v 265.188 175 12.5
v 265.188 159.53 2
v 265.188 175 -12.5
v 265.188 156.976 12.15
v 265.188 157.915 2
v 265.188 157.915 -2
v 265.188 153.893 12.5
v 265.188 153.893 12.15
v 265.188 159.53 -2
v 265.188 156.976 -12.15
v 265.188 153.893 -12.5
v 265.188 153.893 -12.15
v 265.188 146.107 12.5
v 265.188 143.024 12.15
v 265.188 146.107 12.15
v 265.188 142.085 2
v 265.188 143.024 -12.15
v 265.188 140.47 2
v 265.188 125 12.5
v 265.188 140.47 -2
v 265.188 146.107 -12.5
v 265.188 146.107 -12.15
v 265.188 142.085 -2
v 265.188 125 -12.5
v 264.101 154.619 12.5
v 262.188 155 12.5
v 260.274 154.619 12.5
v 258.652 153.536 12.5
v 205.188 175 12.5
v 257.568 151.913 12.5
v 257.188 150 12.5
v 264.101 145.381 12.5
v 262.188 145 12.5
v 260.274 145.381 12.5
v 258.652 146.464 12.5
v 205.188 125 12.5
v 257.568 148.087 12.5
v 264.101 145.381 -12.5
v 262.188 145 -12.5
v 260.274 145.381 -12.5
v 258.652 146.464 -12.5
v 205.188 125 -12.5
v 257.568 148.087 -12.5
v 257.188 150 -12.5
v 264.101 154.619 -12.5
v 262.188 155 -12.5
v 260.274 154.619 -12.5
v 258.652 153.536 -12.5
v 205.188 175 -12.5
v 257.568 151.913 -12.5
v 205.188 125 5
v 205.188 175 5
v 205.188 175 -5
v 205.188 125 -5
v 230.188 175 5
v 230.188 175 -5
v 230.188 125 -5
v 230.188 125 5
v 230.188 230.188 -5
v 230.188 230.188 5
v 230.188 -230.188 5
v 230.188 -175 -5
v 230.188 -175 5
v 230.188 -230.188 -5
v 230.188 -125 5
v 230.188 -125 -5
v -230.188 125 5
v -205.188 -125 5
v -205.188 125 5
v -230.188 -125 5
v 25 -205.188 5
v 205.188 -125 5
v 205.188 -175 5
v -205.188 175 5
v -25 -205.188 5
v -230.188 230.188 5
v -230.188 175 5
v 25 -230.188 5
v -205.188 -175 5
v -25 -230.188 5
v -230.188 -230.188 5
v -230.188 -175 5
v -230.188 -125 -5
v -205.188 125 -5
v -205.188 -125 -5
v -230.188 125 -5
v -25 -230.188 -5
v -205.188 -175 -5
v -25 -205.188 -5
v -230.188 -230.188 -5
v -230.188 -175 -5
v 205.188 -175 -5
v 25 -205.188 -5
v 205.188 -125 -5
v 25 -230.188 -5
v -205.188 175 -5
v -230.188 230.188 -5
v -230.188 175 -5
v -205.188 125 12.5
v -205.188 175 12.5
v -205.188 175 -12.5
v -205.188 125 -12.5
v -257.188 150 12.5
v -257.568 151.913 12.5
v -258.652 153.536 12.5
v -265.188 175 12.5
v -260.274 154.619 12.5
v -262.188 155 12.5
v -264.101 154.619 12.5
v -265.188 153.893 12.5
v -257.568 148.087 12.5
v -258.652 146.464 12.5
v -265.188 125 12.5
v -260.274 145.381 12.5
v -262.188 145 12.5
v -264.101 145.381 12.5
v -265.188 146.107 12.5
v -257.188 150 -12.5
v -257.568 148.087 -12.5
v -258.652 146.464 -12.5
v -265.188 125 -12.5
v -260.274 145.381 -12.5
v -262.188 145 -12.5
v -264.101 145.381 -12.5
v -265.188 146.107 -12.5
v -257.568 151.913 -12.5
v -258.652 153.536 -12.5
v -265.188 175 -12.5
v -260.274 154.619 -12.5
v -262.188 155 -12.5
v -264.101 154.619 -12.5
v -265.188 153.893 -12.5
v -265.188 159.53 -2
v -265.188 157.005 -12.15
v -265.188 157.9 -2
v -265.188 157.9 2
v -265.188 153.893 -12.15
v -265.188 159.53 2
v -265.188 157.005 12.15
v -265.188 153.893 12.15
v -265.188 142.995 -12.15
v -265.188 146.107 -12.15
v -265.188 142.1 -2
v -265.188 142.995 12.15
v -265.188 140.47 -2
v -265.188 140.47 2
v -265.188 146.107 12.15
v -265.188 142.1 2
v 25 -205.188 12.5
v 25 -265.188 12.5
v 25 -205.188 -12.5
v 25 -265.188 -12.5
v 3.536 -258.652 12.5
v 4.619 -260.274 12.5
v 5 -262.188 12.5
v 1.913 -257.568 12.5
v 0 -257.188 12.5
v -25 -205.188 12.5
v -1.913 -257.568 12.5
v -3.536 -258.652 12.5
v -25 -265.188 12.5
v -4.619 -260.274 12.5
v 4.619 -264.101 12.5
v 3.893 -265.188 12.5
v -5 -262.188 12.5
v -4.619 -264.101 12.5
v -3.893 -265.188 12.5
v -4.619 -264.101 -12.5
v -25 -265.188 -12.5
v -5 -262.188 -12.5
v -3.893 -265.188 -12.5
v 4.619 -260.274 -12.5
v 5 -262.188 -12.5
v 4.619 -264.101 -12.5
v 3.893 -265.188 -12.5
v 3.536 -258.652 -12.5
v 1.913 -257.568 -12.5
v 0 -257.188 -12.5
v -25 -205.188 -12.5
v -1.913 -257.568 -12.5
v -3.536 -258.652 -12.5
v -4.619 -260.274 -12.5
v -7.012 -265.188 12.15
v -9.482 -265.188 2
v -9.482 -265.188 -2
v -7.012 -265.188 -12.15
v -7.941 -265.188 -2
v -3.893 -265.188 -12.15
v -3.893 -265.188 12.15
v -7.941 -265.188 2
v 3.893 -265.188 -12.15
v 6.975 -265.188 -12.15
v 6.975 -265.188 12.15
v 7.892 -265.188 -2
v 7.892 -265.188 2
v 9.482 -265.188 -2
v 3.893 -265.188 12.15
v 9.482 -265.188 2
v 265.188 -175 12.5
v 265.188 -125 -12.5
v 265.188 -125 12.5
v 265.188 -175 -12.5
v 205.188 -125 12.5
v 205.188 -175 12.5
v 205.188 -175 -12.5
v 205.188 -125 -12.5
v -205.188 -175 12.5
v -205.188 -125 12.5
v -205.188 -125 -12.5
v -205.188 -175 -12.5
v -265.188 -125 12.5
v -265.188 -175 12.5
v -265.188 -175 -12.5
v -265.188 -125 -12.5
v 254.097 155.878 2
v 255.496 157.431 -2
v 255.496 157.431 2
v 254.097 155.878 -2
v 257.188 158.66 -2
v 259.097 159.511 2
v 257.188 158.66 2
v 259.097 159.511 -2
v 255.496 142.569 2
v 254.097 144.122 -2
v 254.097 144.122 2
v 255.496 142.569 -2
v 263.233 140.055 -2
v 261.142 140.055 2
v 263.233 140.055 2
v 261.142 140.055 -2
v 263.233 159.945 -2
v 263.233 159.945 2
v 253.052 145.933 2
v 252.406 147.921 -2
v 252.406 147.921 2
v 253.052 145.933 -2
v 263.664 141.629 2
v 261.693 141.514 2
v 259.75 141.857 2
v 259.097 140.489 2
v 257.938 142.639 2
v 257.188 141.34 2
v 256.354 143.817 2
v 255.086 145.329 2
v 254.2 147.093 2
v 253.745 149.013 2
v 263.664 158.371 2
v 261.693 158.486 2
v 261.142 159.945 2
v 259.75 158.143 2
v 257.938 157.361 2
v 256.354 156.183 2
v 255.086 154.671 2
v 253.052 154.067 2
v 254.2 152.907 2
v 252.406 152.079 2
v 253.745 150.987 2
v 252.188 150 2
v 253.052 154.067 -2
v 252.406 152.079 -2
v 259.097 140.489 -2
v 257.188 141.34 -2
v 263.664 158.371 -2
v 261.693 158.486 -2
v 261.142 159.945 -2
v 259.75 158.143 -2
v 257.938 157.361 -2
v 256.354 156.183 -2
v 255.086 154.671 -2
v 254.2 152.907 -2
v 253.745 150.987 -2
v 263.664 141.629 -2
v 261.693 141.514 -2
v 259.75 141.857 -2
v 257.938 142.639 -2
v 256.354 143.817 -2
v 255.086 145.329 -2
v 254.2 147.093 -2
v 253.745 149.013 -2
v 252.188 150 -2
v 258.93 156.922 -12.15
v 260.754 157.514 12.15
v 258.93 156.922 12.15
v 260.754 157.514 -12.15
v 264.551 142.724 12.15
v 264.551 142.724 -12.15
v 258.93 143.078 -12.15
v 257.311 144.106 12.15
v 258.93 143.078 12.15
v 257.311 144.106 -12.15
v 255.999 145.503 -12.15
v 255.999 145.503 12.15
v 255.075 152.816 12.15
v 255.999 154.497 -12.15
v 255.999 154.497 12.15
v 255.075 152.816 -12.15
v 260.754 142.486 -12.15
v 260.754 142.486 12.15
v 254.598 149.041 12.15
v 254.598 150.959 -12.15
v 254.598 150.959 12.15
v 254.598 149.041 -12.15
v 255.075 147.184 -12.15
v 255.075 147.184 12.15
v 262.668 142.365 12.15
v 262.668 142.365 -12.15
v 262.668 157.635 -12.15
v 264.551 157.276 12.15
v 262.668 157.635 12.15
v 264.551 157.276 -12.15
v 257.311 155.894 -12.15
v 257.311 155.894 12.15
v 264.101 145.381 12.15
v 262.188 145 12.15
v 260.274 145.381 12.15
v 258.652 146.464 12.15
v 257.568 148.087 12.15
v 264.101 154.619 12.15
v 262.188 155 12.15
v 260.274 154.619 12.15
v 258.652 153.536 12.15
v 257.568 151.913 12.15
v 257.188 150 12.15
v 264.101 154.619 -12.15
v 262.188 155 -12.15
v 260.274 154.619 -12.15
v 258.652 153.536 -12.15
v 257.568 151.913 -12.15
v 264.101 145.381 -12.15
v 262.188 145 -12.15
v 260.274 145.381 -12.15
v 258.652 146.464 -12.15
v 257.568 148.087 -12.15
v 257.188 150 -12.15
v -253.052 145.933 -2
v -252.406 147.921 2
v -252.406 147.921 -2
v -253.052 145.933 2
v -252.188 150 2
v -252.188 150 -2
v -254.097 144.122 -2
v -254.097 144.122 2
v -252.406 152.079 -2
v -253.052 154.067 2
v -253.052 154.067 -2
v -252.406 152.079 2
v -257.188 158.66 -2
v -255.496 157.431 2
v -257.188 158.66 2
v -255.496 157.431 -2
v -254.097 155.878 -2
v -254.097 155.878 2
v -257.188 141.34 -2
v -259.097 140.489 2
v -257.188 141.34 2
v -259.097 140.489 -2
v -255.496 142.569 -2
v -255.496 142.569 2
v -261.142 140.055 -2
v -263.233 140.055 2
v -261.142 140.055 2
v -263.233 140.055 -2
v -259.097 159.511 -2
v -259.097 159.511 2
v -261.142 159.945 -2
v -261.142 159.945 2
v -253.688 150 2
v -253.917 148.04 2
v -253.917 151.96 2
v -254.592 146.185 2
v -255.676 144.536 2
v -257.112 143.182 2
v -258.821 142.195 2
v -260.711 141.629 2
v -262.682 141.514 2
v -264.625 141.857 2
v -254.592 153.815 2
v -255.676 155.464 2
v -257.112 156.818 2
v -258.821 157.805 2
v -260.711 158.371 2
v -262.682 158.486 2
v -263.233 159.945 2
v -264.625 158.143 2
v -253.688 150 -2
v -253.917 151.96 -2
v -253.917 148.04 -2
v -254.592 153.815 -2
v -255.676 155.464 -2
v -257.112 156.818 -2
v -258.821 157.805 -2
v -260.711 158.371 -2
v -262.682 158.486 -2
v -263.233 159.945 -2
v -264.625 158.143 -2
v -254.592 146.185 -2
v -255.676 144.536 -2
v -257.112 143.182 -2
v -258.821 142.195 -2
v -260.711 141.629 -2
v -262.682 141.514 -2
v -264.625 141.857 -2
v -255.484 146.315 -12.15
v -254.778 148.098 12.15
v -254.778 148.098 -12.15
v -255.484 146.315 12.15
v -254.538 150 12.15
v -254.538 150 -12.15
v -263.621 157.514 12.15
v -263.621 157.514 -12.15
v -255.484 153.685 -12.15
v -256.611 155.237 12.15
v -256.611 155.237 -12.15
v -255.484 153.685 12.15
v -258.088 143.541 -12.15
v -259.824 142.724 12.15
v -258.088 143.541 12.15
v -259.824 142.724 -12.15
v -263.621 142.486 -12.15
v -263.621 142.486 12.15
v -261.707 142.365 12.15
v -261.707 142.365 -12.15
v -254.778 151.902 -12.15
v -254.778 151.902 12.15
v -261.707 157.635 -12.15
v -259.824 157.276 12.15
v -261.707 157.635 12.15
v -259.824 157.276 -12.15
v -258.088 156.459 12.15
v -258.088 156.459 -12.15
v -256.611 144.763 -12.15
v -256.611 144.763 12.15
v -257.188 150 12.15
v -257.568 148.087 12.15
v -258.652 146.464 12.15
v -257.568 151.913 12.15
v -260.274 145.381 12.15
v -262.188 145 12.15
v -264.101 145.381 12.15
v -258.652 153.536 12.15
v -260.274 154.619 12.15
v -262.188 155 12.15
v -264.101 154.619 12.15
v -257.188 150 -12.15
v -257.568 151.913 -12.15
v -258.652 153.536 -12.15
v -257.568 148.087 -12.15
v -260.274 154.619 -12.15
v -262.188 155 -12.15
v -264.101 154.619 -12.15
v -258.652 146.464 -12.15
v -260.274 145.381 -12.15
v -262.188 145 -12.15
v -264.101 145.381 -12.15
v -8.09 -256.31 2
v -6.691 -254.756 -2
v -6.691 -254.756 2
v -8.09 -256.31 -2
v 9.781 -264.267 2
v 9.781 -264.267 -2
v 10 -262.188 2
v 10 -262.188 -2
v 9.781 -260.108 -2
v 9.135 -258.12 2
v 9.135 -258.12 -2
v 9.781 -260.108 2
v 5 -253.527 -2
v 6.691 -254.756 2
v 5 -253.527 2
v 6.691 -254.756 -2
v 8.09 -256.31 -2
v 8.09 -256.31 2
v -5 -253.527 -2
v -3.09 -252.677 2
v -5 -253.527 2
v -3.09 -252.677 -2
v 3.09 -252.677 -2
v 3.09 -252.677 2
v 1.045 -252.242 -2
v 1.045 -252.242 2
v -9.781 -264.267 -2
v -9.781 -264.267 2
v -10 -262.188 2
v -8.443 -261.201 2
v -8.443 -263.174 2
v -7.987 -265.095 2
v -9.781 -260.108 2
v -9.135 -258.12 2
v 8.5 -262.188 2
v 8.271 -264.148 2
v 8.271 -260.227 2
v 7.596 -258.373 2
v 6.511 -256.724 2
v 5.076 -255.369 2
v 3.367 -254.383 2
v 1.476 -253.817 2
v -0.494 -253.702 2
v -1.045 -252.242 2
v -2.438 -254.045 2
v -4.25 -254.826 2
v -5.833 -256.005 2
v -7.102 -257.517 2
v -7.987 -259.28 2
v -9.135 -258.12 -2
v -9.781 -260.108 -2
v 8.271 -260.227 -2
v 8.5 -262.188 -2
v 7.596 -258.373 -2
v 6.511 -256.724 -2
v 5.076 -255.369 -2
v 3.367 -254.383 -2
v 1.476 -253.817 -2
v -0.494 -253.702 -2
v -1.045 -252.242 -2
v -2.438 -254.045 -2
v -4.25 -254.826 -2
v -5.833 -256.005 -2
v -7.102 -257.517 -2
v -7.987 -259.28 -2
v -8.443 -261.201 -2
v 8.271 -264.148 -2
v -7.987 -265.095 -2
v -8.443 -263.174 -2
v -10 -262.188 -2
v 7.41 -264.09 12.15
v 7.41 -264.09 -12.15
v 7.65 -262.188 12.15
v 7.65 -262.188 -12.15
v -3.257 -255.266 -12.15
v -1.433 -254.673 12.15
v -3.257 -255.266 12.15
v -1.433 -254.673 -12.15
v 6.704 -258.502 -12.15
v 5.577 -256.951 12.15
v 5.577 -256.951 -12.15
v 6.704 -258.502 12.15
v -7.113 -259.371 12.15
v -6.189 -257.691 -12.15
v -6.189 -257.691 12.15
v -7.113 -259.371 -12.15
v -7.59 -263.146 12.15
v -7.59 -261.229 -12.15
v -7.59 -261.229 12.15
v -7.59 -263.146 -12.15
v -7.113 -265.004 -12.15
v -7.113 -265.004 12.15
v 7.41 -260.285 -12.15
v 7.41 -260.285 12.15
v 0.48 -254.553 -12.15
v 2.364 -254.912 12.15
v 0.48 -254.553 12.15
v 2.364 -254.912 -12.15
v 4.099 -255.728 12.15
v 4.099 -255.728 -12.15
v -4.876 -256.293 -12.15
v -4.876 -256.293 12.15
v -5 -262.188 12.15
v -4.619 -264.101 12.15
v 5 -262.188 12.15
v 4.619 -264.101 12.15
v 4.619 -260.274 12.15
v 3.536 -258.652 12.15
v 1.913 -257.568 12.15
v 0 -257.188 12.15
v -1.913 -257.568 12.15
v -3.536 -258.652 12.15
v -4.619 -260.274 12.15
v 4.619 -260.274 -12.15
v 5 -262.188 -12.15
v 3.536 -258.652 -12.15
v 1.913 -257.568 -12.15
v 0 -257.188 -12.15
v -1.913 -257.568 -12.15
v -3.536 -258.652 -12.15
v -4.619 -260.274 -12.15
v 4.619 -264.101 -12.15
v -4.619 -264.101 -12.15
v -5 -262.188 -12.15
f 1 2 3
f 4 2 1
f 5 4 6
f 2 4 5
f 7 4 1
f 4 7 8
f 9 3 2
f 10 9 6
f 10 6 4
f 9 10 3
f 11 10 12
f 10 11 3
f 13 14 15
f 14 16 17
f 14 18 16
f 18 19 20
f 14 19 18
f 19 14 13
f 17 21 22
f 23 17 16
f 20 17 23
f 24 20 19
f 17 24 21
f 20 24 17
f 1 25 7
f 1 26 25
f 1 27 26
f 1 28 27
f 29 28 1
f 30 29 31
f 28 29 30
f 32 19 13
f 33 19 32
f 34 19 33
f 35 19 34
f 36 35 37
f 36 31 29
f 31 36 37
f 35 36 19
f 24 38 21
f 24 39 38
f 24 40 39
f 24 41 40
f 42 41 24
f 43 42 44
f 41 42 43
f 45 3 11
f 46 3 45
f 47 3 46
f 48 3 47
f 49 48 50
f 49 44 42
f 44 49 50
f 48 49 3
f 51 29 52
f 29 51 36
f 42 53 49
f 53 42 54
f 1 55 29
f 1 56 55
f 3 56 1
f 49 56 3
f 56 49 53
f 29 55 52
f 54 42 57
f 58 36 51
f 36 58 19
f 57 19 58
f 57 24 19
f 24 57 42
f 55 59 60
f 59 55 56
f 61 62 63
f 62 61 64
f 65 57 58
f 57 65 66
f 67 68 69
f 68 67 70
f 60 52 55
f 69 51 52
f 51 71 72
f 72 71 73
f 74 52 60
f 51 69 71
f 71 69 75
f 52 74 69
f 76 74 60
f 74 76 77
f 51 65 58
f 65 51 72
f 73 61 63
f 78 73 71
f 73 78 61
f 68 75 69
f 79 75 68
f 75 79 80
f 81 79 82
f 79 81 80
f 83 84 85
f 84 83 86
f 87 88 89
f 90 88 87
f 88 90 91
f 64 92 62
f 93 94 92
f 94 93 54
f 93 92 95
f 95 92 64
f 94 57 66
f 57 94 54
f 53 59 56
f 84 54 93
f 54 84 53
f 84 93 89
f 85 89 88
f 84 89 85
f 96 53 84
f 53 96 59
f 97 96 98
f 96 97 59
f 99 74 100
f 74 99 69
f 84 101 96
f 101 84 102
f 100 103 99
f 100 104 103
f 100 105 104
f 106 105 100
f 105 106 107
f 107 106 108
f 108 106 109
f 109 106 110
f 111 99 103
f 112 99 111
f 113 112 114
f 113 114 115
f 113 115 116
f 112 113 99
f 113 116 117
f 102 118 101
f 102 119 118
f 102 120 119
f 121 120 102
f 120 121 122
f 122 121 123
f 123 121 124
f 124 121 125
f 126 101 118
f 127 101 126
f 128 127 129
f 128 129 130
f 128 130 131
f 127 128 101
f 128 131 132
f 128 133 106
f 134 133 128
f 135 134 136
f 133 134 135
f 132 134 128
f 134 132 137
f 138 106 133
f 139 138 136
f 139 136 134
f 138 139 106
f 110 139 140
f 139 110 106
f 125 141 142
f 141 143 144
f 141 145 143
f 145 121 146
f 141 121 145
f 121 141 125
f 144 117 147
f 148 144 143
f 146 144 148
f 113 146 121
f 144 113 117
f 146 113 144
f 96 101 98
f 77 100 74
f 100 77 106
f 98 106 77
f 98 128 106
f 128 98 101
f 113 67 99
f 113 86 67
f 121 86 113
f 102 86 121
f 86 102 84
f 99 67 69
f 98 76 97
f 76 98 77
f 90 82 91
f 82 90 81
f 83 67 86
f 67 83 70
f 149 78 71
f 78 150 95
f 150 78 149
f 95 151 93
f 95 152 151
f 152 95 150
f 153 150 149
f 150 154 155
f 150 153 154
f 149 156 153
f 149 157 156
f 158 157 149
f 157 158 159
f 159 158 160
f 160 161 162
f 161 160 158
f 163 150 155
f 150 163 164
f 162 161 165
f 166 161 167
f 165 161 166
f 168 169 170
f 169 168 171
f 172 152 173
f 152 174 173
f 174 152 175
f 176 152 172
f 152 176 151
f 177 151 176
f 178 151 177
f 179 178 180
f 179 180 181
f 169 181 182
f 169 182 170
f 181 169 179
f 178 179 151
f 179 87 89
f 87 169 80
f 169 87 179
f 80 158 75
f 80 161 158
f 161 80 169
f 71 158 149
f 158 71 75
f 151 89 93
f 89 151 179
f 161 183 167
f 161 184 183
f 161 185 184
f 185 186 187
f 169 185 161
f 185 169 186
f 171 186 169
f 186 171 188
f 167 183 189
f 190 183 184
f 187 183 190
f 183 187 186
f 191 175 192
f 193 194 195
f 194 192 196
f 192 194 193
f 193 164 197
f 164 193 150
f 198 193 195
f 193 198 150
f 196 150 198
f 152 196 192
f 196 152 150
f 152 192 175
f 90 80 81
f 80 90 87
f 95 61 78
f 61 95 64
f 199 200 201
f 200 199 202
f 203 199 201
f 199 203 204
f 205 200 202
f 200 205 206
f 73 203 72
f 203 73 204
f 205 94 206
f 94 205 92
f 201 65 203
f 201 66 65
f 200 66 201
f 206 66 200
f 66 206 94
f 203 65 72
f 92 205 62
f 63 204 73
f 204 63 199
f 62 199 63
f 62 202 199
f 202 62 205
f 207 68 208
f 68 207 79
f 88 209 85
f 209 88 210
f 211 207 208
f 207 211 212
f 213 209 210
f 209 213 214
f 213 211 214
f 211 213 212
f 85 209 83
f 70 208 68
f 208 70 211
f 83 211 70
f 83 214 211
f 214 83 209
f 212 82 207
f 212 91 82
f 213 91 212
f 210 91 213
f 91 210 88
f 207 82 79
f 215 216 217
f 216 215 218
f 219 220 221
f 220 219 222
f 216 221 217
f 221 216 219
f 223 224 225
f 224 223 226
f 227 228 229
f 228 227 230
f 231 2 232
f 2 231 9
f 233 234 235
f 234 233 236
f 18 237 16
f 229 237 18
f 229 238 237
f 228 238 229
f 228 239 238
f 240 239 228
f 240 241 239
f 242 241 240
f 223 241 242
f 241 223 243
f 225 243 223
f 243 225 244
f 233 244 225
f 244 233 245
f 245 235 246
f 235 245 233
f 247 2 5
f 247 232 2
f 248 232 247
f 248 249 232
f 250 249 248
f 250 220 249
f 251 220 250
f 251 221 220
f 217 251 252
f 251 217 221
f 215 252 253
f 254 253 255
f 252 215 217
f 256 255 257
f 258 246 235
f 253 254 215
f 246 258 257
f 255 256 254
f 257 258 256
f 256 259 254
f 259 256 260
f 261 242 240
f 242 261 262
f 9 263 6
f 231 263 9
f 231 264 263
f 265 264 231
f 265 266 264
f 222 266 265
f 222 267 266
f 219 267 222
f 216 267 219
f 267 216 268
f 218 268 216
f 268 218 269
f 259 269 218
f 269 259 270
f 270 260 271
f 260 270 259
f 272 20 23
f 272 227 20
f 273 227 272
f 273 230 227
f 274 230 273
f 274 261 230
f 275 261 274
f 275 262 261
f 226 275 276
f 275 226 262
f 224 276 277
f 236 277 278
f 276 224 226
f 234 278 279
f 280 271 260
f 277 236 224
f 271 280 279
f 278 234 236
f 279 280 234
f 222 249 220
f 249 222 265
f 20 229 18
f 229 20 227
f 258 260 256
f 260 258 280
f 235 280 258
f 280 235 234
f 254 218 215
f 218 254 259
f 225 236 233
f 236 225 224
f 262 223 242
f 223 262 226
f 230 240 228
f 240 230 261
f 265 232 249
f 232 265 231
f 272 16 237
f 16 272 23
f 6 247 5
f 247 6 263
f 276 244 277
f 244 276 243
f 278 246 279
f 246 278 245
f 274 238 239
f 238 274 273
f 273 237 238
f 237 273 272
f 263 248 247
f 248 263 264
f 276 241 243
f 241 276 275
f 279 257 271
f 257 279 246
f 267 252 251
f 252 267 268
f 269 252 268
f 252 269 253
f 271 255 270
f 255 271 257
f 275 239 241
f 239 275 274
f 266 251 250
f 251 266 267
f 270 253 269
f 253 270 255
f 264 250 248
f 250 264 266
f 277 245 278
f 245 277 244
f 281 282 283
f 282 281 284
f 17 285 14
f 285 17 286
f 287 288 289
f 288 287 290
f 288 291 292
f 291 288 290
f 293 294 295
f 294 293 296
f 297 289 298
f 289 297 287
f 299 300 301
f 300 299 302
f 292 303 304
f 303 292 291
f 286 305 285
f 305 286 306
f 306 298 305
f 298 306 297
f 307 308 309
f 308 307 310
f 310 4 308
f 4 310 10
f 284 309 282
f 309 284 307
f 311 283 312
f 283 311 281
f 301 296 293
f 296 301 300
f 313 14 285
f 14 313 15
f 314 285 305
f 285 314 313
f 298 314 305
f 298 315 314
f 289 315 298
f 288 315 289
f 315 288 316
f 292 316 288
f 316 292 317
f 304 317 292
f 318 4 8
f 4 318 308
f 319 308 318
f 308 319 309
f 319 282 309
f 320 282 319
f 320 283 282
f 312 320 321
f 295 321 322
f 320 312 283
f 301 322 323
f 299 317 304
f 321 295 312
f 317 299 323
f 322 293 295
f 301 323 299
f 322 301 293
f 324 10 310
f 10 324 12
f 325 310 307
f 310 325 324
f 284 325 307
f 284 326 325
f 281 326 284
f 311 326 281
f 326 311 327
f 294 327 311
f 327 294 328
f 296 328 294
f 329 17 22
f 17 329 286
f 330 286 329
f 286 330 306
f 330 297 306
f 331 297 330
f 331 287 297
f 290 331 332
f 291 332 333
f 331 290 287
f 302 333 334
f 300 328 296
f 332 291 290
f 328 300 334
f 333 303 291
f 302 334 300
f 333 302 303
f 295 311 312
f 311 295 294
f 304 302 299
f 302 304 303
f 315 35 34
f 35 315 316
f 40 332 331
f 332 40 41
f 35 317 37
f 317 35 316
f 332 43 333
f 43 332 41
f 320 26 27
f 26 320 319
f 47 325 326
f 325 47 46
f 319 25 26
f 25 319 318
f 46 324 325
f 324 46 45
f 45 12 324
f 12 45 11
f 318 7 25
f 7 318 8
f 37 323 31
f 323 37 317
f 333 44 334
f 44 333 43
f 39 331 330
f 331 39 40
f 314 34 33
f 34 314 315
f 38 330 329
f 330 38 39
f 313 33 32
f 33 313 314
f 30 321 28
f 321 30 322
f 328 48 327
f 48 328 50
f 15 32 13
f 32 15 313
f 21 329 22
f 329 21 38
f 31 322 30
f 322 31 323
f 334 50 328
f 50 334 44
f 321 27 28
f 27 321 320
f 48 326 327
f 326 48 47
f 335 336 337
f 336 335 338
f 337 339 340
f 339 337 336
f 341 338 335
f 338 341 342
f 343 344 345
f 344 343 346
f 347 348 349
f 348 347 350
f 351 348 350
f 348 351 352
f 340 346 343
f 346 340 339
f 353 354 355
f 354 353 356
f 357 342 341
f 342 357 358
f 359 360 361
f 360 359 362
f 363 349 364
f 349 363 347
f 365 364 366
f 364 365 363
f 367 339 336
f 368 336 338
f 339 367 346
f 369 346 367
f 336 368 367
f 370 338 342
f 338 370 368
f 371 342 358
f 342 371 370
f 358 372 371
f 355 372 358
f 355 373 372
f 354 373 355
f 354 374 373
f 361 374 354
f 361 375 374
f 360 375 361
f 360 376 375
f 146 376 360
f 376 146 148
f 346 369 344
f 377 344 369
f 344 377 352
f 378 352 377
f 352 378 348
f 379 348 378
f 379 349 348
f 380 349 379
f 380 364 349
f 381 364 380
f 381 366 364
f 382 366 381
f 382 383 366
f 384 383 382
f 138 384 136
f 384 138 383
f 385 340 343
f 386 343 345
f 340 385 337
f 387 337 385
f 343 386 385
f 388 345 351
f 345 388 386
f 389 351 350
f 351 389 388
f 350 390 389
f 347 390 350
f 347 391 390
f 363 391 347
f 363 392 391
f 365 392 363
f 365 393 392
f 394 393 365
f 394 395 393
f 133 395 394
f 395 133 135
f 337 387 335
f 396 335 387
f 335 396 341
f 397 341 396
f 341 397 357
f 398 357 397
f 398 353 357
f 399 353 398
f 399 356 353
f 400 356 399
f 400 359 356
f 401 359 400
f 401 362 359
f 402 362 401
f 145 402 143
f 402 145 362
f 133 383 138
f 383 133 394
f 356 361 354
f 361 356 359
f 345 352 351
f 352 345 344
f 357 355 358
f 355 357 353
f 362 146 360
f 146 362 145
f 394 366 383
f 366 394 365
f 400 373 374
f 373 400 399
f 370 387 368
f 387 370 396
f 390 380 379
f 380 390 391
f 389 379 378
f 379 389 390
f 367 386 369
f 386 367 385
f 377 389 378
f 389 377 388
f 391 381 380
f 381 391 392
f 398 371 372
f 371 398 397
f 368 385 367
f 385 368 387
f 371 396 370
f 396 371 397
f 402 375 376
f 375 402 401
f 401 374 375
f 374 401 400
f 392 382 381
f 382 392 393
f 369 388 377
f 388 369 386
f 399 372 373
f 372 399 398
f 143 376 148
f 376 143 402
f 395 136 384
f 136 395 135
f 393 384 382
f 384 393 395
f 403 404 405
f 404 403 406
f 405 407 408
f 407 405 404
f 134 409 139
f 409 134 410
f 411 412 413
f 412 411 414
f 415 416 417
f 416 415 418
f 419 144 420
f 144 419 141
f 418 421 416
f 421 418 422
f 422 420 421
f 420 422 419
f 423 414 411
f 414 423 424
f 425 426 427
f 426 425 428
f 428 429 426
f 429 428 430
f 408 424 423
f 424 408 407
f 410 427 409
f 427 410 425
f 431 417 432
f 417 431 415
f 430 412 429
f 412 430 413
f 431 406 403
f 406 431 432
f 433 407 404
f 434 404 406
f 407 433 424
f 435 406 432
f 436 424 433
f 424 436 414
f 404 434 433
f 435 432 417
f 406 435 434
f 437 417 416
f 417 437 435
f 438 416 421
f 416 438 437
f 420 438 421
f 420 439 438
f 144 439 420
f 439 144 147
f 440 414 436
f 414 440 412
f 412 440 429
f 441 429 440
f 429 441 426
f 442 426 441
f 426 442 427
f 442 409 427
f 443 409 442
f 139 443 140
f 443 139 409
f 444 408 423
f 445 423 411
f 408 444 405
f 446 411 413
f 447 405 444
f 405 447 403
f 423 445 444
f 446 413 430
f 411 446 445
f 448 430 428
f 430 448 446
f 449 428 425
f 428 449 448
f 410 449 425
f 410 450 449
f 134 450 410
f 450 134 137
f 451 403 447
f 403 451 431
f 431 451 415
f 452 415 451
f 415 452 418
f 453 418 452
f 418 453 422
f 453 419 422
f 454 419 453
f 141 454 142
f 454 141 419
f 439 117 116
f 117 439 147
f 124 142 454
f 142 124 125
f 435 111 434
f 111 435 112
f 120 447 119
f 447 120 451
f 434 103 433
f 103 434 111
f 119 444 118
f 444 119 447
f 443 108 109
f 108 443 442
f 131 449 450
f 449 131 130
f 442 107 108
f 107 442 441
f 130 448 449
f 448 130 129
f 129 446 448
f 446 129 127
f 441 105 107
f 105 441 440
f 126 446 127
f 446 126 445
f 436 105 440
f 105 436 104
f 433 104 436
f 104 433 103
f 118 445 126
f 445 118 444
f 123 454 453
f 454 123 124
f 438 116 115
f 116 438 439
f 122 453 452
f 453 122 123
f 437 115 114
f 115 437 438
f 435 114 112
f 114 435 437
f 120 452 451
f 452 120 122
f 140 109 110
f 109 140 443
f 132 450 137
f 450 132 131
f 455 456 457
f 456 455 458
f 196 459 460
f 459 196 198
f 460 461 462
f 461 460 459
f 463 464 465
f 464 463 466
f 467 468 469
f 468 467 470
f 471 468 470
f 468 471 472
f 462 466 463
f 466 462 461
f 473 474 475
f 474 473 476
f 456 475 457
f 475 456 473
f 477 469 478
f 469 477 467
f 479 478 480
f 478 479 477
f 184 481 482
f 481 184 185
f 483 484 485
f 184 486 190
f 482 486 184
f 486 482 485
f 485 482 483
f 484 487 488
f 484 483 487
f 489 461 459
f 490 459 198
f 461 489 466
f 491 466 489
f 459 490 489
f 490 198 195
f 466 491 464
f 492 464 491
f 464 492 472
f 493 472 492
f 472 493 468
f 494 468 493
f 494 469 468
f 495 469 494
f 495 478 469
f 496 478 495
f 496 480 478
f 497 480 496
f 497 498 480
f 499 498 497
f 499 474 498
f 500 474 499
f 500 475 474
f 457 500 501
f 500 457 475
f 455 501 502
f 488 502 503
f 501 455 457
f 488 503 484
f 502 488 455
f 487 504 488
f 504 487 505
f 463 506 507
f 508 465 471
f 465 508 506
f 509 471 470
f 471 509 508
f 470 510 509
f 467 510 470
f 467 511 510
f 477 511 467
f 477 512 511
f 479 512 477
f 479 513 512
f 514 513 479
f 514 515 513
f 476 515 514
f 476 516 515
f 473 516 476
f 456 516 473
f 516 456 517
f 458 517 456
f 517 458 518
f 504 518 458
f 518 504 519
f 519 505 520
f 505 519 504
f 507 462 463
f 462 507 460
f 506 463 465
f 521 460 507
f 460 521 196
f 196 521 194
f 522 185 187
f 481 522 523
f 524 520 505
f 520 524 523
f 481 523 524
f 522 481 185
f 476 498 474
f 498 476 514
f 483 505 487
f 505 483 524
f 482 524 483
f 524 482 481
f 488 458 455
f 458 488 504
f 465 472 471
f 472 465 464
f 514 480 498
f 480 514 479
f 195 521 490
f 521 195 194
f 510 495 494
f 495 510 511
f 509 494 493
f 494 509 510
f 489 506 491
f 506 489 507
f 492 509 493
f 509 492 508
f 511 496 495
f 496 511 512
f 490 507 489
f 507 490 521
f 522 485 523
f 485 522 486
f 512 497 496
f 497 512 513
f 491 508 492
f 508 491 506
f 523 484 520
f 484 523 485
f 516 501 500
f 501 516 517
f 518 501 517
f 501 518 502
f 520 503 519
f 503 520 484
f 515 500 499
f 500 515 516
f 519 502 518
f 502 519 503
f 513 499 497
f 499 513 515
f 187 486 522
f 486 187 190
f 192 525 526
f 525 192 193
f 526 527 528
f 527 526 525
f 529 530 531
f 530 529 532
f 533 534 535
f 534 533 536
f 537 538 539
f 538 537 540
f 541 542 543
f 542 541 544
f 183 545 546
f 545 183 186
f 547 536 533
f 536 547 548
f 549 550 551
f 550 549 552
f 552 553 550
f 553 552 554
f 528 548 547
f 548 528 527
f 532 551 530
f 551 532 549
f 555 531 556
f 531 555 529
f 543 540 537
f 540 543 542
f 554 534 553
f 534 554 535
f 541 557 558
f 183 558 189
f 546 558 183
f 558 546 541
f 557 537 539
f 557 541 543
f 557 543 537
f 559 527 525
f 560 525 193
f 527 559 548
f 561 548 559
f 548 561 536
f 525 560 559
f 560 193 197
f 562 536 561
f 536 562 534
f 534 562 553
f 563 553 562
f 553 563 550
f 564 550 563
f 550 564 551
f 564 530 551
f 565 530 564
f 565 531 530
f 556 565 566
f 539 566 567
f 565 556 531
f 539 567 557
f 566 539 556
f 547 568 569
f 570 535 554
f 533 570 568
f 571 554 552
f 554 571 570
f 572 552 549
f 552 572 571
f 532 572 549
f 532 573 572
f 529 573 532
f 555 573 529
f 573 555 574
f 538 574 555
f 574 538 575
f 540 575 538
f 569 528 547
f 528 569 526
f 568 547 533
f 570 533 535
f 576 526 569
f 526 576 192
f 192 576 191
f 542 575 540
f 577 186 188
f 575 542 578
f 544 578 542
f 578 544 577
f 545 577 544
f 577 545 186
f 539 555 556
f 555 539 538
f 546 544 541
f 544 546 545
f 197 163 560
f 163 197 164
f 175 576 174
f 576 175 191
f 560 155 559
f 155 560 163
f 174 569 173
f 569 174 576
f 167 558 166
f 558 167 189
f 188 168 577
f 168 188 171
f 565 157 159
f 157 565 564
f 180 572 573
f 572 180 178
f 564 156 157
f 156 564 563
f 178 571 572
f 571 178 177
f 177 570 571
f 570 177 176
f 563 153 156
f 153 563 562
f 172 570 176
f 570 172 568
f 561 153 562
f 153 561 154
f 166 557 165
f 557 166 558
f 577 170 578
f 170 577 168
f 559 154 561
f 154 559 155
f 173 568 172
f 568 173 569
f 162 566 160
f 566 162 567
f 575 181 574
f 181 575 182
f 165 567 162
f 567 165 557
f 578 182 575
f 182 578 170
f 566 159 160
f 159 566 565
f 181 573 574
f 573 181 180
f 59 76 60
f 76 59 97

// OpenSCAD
// file: xcarriage.scad
$fn = 50;
module bearing(){
	rotate([90,0,0]){
		cylinder(24.3,7.65,7.65,true);
		cylinder(500,5,5,true);
		difference(){
			cylinder(4,10,10,true);
			cylinder(4.5,8.5,8.5,true);
		}
	}
}
module e3dlite(){
    translate([0,0,24 + 3.7/2]){
        cylinder(3.9,8,8,true);
    }
    translate([0,0,21]){
        cylinder(6.1,6,6,true);
    }
    translate([0,0,16.5]){
        cylinder(3.2,8,8,true);
    }
    cylinder(30,11.5,11.5,true);
}
module test(a,l){
	difference() {
		cylinder(r=a, h=10, center=true);
		cylinder(r=a-.1, h=10, center=true);
		translate([0, -l, 0]) {
			cube(2*a, center=true);
		}
	}
}
module minktest(a,l,w) {
	minkowski(){
		test(a,l);
		cylinder(.1,w,w);
	}
}
module catch(){
    cylinder(8,.75,.75,true,$fn=4);
	translate([2,0,0]){
		cylinder(8,.75,.75,true,$fn=4);
	}
	translate([-2,0,0]){
		cylinder(8,.75,.75,true,$fn=4);
	}
	translate([4,0,0]){
		cylinder(8,.75,.75,true,$fn=4);
	}
	translate([-4,0,0]){
		cylinder(8,.75,.75,true,$fn=4);
	}
	
}
module thing(){
	translate([0, -10, 5]) {
			cylinder(15,11.5,15,true);
	}
	translate([0,-10,0]){
		rotate([0,0,0]){
			translate([12,12,10]){
				cylinder(20,1.5,1.5,true);
			}
			translate([12,-12,10]){
				cylinder(20,1.5,1.5,true);
			}
			translate([-12,12,10]){
				cylinder(20,1.5,1.5,true);
			}
			translate([-12,-12,10]){
				cylinder(20,1.5,1.5,true);
			}
		}
	}
	difference(){
		hull(){
			translate([0,-10,0]){
				cylinder(5,11.5,11.5,true);
			}
			translate([0,15,-4]){
				cylinder(20,11.5,11.5,true);
			}
		}
	}
	hull(){
			translate([0,15,-4]){
				cylinder(20,11.5,11.5,true);
			}
			translate([0,25,-7.5]){
				cylinder(30,11.5,11.5,true);
			}
		}
}

module xcarriage(){
	difference(){
        union(){
            minkowski(){
                cube([57,52,22],true);
                cylinder(8,5,5,true);
                sphere(4);
            }
		
            minkowski(){
                translate([0,20,0]){
                    cylinder(48,11,11,true);
                }
                sphere(4);
            }
        }
		translate([0,0,-21]){
			cube([76,110,20],true);
		}
        translate([0,-35,29]){
			cube([76,110,20],true);
		}
		translate([10,44.5,20]){
			cylinder(20,1.5,1.5,true);
		}
		translate([-10,44.5,20]){
			cylinder(20,1.5,1.5,true);
		}
		translate([25,0,-8]){
			bearing();
		}
		translate([-25,20,-8]){
			bearing();
		}
		translate([-25,-20,-8]){
			bearing();
		}
        translate([0,20,4]){
            e3dlite();
        }
		translate([0,32,0]){
			rotate([90,0,0]) {
				minktest(15,2,1);
			}
		}
		translate([0,32,-5]){
			rotate([90,0,0]) {
				minktest(15,2,1);
			}
		}
		translate([0,32,-11]){
			rotate([90,0,0]) {
				minktest(15,2,1);
			}
		}
		translate([0,32,-16]){
			rotate([90,0,0]) {
				minktest(15,2,1);
			}
		}
		translate([0,32,-21]){
			rotate([90,0,0]) {
				minktest(15,2,1);
			}
		}
		translate([12.5,13.5-15,11.5]){
			rotate([0,0,30])
			thing();
		}
		translate([-5,-20,12]){
			cylinder(40,10,10,true);
		}
		translate([-5,-20,0]){
			cylinder(40,6,6,true);
		}
        translate([-16,0,5]){
            cube([4,100,8],true);
        }
        translate([10,-35,-1]){
            rotate([90,0,0]){
                cylinder(20,1.5,1.5,true);
            }
        }
        translate([10,-35,11]){
            rotate([90,0,0]){
                #cylinder(20,1.5,1.5,true);
            }
        }
		translate([22,35,5]){
			catch();
		}
		translate([22,35,-1]){
            rotate([90,0,0]){
                cylinder(20,1.5,1.5,true);
            }
        }
        translate([22,35,11]){
            rotate([90,0,0]){
                #cylinder(20,1.5,1.5,true);
            }
        }
	}
}
xcarriage();

module top(){
	difference(){
		xcarriage();
		translate([0,0,-3.5]){
			cube([110,110,40],true);
		}
	}
}
module bottom(){
	intersection(){
		xcarriage();
		translate([0,0,-3.5]){
			cube([110,110,40],true);
		}
	}
}
//top();
//bottom();	
//minktest(15,15,1);
//thing();
//catch();
// main file
use <xcarriage.scad>
module buildplate(){
  cube([460.375, 460.375, 10], center = true);
}
module bearing(){
	rotate([90,0,0]){
		cylinder(24.3,7.65,7.65,true);
		cylinder(500,5,5,true);
		difference(){
			cylinder(4,10,10,true);
			cylinder(4.5,8.5,8.5,true);
		}
	}
}

module insetNut(){

}
module main(){
  difference(){
    union(){
      difference(){
        translate([460.375/2 +5, 150, 0]) {
          cube([60, 50, 25], center = true);
        }
        buildplate();
      }
      difference(){
        translate([-(460.375/2+5), 150, 0]) {
          cube([60, 50, 25], center = true);
        }
        buildplate();
      }

      difference(){
        translate([0, -460.375/2-5, 0]) {
          cube([50, 60, 25], center = true);
        }
        buildplate();
      }
      difference(){
        translate([460.375/2+5, -150, 0]) {
          cube([60, 50, 25], center = true);
        }
        buildplate();
      }
      difference(){
        translate([-(460.375/2+5), -150, 0]) {
          cube([60, 50, 25], center = true);
        }
        buildplate();
      }
    }
    union(){
      translate([(460.375/2 + 15), (-150), 0]) {
        rotate([90, 0, 0]) {
          insetNut();
        }
      }
      translate([(460.375/2 + 32), (150), 0]) {
        rotate([90, 0, 0]) {
          #bearing();
        }
      }
      translate([-(460.375/2 + 15), (-150), 0]) {
        rotate([90, 0, 0]) {
          insetNut();
        }
      }
      translate([-(460.375/2 + 32), (150), 0]) {
        rotate([90, 0, 0]) {
          #bearing();
        }
      }
      translate([0, (-(460.375/2 + 32)), 0]) {
        rotate([90, 0, 0]) {
          #bearing();
        }
      }
    }
  }
}
buildplate();
main();
